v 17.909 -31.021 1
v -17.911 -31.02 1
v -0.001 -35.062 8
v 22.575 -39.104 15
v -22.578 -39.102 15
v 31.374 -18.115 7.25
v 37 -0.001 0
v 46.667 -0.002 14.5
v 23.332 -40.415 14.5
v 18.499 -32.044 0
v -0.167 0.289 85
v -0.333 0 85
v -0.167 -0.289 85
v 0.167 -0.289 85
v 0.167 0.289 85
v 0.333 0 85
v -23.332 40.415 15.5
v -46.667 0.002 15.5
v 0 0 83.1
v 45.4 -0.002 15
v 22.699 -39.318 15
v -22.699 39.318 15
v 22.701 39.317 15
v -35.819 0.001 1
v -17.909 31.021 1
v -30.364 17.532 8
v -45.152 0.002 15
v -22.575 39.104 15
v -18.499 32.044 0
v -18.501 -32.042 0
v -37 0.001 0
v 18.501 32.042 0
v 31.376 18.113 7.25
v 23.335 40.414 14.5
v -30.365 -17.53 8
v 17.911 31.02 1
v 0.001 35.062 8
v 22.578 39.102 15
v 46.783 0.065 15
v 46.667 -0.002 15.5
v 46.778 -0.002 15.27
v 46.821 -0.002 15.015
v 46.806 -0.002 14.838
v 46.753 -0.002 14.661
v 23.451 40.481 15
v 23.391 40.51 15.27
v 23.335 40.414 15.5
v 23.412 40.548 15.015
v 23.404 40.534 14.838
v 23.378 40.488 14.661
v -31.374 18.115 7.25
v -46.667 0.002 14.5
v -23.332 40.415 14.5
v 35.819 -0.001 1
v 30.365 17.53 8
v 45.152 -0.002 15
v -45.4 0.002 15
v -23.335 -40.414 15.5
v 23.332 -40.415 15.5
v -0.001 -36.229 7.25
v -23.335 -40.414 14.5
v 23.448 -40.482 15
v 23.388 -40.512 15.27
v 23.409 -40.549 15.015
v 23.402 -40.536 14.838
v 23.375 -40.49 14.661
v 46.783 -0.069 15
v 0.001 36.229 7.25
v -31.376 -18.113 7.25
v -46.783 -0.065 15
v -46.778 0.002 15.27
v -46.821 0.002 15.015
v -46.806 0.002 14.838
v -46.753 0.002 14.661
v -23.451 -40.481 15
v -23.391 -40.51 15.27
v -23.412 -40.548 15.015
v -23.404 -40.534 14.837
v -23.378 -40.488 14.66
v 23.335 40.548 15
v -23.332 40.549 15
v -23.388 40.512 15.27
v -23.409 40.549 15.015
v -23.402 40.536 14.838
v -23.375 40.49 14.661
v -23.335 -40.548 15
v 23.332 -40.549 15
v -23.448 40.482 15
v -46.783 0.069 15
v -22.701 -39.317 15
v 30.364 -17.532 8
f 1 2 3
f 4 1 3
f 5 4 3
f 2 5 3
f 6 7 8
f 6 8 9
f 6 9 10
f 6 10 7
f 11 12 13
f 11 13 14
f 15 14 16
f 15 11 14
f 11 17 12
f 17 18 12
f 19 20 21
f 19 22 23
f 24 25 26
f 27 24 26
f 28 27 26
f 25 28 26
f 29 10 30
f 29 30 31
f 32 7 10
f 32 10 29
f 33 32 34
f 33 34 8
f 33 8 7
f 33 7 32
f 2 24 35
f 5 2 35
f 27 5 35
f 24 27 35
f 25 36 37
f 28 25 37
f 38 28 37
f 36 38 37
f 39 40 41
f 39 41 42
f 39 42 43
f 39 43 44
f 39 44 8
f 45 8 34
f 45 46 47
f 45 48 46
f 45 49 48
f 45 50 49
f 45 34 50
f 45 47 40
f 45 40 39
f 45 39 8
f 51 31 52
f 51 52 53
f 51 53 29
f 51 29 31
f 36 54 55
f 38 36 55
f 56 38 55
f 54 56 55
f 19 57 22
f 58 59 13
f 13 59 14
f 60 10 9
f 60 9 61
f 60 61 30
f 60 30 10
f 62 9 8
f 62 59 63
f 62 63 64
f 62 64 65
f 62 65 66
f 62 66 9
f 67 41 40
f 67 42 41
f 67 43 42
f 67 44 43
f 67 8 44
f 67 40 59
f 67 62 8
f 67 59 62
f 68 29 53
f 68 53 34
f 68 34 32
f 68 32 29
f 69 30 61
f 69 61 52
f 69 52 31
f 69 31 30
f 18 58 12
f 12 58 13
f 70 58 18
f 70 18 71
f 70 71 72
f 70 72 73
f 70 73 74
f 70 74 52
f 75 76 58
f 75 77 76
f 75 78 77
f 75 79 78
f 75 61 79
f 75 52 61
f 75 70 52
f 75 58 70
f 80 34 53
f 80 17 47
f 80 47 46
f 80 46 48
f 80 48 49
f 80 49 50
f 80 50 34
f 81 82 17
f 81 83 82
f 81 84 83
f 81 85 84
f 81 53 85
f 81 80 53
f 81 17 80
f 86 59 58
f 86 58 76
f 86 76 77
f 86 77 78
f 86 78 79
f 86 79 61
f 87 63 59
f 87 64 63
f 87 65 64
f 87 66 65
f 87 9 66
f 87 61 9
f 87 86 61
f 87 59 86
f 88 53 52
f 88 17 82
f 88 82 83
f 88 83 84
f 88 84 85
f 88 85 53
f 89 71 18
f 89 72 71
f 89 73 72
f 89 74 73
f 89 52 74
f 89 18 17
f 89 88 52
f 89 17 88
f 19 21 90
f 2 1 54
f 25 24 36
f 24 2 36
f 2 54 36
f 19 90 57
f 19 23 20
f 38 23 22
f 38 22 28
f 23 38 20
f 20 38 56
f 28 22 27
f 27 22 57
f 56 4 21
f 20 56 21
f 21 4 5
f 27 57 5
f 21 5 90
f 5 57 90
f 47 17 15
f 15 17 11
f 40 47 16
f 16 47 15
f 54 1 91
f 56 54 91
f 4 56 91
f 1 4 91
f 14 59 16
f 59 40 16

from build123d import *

# Parameters (mm, degrees)
F1_DEPTH = 15
F1_TAPER = -30
F2_DEPTH = 15
F2_TAPER = -30
F3_DEPTH = 1
F3_TAPER = -35
F5_DEPTH = 70
F5_TAPER = 30
F9_R     = 1


# Not quite as in the source:
# - an extrude whose draft closes it to a point is written as a loft to that point


with BuildPart() as f1:
    # F0 (on Top) → F1 (new body)
    with BuildSketch(Plane.XY):
        Polygon((-18.4989116336, 32.043568284), (-36.9999999787, 0.0012567249), (-18.501088345, -32.0423115591), (18.4989116336, -32.043568284), (36.9999999787, -0.0012567249), (18.501088345, 32.0423115591), align=None)
        Polygon((17.57727357, 30.442342936), (35.1524791183, -0.0011939729), (17.5752055483, -30.4435369089), (-17.57727357, -30.442342936), (-35.1524791183, 0.0011939729), (-17.5752055483, 30.4435369089), align=None, mode=Mode.SUBTRACT)
    extrude(amount=F1_DEPTH, taper=F1_TAPER)

    # F0 (on Top) → F2 (cut)
    with BuildSketch(Plane.XY):
        Polygon((17.5752055483, -30.4435369089), (35.1524791183, -0.0011939729), (17.57727357, 30.442342936), (-17.5752055483, 30.4435369089), (-35.1524791183, 0.0011939729), (-17.57727357, -30.442342936), align=None)
    extrude(amount=F2_DEPTH, taper=F2_TAPER, mode=Mode.SUBTRACT)

    # F0 (on Top) → F3 (join)
    with BuildSketch(Plane.XY):
        Polygon((17.5752055483, -30.4435369089), (35.1524791183, -0.0011939729), (17.57727357, 30.442342936), (-17.5752055483, 30.4435369089), (-35.1524791183, 0.0011939729), (-17.57727357, -30.442342936), align=None)
    extrude(amount=F3_DEPTH, taper=F3_TAPER)


with BuildPart() as f5:
    # F4 (on face) → F5 (new body)
    with BuildSketch(Plane.XY.offset(15)):
        Polygon((23.4986174805, -40.7039921445), (46.9999999729, -0.0015963803), (23.5013824923, 40.7023957642), (-23.4986174805, 40.7039921445), (-46.9999999729, 0.0015963803), (-23.5013824923, -40.7023957642), align=None)
    extrude(amount=F5_DEPTH, taper=F5_TAPER)

    # F6 (on face) → F7 section 0
    with BuildSketch(Plane(origin=(0, 0, 15), x_dir=(1, 0, 0), z_dir=(0, 0, -1)), mode=Mode.PRIVATE) as f7_s0:
        Polygon((45.3999999738, 0.0015420354), (22.698664545, 39.3183243269), (-22.7013354288, 39.3167822914), (-45.3999999738, -0.0015420354), (-22.698664545, -39.3183243269), (22.7013354288, -39.3167822914), align=None)
    loft([f7_s0.sketch, Vertex(0, 0, 83.1)], ruled=True, mode=Mode.SUBTRACT)


with BuildPart() as f1_1:
    add(f1.part)

    # F8: union F5
    add(f5.part)

    # F9
    f9_edges = [f1_1.edges().sort_by_distance(p)[0] for p in [
        (-0.001383, -40.703194, 15),
        (35.249309, -20.352794, 15),
        (35.250691, 20.3504, 15),
        (0.001383, 40.703194, 15),
        (-35.249309, 20.352794, 15),
        (-35.250691, -20.3504, 15),
    ]]
    fillet(f9_edges, radius=F9_R)


solid = f1_1.part
